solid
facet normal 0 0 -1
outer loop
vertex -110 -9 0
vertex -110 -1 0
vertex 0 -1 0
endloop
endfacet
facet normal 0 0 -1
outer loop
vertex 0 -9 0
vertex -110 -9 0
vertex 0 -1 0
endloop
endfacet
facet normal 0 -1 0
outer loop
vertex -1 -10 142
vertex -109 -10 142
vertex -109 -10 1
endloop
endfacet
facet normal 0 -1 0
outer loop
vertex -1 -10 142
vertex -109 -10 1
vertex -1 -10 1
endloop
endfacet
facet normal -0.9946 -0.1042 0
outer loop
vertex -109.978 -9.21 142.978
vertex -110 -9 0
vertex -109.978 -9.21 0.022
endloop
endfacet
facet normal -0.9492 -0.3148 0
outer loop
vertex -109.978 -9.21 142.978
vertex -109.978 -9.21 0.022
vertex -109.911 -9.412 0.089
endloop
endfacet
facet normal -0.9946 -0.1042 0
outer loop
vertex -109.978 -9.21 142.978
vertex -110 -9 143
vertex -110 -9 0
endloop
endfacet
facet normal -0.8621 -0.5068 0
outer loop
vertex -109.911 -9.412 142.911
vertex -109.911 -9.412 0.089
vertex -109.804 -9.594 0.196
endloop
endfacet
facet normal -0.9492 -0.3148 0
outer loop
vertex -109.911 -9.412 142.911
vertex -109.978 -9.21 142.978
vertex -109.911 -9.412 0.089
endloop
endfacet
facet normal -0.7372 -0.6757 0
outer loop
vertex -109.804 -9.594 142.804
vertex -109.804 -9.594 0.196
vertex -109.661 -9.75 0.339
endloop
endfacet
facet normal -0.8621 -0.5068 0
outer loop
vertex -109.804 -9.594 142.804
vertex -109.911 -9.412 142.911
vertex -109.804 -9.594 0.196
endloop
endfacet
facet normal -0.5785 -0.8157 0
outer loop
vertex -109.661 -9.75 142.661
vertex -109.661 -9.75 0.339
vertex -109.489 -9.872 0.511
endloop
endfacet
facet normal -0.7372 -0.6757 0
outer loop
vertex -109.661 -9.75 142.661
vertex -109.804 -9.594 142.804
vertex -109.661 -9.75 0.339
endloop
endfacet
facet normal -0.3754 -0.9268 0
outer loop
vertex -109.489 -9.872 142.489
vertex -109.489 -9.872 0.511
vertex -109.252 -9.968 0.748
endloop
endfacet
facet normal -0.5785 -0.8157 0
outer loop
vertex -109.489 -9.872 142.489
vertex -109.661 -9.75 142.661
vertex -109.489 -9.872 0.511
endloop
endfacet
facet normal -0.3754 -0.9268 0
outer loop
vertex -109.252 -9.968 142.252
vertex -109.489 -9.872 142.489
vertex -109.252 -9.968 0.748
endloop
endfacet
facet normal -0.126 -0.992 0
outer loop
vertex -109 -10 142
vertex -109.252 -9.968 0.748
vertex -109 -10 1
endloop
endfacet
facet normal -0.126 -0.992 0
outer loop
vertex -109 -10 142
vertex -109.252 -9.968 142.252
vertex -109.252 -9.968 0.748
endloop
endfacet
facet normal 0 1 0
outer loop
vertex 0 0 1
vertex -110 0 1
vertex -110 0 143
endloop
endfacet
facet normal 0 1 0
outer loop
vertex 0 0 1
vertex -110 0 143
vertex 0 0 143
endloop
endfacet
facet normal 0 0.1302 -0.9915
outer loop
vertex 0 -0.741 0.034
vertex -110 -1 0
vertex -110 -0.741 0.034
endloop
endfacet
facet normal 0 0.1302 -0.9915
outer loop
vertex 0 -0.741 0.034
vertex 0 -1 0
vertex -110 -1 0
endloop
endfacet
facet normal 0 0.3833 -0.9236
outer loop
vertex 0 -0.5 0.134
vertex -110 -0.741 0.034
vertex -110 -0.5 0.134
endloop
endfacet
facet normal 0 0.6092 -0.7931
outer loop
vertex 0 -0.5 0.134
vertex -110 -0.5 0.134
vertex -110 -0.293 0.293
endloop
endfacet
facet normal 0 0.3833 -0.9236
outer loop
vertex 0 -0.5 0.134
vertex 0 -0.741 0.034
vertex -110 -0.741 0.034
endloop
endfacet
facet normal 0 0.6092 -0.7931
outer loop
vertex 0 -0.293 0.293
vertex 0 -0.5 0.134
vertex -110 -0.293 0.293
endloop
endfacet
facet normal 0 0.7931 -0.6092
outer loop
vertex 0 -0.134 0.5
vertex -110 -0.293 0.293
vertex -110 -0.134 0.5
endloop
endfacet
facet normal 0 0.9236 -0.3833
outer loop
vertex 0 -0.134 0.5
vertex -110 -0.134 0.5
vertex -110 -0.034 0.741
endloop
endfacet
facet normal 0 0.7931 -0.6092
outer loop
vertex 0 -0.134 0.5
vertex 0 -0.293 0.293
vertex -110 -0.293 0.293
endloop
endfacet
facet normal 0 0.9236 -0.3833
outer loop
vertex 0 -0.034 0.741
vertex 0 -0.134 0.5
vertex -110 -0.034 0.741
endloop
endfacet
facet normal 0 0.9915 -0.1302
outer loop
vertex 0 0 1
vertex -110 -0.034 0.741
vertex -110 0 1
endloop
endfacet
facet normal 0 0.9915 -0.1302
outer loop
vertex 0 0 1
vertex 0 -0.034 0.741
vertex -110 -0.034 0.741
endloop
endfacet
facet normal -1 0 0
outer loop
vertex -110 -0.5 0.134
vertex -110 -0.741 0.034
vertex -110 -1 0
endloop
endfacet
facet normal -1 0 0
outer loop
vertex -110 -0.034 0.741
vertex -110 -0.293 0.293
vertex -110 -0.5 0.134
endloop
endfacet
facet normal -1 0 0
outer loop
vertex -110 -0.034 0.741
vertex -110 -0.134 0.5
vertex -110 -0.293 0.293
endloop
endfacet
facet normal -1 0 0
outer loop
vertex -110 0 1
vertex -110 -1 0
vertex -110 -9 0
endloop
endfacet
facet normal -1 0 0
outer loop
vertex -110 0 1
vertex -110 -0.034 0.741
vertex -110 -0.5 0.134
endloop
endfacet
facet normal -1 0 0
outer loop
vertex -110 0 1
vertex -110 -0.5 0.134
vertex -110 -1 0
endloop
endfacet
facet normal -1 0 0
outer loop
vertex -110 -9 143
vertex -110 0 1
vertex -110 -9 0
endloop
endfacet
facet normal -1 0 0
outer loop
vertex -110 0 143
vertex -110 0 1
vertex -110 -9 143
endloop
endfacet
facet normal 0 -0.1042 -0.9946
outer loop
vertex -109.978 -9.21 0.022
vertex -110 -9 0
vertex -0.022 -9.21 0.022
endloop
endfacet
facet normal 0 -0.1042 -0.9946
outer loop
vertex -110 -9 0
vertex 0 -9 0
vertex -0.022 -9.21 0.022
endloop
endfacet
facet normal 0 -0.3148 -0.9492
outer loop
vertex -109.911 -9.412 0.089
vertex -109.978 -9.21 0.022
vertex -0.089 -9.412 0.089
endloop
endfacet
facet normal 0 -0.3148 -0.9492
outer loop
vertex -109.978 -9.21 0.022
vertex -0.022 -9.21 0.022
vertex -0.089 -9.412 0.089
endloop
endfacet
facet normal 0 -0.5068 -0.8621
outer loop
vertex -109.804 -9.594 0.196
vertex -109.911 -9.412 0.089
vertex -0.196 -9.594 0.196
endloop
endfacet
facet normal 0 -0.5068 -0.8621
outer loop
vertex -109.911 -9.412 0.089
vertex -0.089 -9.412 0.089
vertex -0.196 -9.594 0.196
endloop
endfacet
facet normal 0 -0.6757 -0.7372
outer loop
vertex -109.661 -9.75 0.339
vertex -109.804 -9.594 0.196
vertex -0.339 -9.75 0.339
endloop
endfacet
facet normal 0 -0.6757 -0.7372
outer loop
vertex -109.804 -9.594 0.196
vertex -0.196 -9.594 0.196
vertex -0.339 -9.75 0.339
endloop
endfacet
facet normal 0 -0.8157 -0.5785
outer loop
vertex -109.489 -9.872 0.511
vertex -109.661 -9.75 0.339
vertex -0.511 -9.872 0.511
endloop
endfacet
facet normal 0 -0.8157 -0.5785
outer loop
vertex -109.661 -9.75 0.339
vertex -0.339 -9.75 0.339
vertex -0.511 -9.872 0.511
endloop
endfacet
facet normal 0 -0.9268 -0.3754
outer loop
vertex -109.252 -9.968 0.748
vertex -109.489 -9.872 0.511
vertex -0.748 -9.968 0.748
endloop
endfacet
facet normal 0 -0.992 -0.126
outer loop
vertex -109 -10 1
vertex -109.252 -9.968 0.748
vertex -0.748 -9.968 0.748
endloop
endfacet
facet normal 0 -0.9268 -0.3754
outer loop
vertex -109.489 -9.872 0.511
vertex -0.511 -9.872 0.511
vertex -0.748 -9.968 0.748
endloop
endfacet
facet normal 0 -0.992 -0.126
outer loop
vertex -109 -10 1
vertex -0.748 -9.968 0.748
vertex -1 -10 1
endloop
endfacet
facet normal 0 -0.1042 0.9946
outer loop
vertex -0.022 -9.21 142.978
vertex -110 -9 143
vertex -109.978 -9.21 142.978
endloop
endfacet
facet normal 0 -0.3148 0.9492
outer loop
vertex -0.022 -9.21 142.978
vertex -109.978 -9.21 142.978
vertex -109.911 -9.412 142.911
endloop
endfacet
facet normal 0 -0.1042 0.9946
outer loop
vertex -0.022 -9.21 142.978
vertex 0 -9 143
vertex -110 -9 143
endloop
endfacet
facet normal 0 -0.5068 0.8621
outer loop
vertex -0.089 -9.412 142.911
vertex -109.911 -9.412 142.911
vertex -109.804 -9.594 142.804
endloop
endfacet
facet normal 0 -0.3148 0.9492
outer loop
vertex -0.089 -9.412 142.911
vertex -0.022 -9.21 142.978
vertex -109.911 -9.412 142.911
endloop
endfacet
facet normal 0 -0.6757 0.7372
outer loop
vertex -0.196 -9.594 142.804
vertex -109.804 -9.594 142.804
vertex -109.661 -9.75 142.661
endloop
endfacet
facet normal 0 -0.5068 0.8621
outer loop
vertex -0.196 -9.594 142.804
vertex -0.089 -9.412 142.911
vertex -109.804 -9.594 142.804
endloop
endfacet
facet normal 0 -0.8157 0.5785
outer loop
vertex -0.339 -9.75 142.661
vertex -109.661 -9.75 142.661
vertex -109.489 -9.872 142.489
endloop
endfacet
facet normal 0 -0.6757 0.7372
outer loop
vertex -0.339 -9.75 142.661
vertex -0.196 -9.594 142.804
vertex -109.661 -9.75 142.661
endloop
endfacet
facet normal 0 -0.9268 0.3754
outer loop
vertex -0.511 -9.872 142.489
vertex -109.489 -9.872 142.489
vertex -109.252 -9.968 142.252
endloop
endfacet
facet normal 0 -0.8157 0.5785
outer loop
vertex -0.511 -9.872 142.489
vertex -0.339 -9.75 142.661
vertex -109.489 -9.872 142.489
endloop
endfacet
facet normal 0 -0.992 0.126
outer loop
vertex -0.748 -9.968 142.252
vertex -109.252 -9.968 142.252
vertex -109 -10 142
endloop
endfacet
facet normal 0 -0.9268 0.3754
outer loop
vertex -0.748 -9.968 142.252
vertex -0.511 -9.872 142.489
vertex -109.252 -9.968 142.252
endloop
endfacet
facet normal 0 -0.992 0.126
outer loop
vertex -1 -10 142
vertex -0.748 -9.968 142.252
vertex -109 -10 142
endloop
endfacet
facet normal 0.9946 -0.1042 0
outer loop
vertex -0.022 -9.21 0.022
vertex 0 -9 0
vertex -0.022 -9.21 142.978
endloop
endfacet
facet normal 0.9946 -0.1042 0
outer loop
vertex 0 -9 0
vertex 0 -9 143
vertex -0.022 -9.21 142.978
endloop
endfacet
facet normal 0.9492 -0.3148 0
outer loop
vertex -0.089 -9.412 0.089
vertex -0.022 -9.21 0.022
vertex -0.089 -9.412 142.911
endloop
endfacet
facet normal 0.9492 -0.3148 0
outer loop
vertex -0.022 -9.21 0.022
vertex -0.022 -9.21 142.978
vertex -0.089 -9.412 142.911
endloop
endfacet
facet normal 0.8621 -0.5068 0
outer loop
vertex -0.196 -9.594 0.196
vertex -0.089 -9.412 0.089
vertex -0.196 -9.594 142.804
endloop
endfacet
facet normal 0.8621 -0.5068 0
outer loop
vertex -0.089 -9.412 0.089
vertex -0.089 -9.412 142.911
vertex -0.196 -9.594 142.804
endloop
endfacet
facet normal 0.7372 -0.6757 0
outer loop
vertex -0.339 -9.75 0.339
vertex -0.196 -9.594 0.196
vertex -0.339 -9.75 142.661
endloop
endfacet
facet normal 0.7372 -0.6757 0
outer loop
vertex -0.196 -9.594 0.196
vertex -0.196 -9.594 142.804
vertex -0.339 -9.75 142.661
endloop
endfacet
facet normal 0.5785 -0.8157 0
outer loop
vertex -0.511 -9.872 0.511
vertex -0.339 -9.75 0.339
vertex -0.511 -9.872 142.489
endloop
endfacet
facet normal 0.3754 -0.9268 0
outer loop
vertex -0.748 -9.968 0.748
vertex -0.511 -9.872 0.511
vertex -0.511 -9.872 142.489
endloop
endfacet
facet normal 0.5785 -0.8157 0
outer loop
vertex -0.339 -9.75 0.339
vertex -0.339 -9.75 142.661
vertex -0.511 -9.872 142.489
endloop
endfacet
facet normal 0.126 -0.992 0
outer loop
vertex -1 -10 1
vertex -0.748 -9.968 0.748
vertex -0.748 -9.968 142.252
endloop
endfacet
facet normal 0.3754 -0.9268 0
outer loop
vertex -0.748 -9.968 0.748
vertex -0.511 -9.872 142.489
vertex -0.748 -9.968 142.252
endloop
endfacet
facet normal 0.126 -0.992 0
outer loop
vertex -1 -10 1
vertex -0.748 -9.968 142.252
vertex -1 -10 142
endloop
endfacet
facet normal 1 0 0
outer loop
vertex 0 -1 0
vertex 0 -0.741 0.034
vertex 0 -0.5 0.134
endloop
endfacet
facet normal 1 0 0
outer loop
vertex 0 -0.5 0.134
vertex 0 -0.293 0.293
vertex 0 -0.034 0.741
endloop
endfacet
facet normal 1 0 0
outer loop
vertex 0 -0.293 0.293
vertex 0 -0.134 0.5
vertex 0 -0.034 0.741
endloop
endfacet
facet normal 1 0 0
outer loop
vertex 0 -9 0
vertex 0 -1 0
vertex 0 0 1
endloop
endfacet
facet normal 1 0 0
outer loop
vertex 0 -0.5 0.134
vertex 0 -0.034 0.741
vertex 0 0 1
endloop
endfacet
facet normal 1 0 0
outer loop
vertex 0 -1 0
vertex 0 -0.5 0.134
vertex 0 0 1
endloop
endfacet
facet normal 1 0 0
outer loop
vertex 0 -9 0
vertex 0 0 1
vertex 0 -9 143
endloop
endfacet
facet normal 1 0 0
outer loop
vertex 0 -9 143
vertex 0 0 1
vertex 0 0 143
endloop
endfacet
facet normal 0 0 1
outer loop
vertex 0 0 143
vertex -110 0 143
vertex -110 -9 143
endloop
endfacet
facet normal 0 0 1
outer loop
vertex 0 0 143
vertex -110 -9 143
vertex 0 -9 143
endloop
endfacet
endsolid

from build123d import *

# Parameters (mm, degrees)
F0_W     = 110
F0_H     = 143
F1_DEPTH = 10
F2_R     = 1


with BuildPart() as f1:
    # F0 (on Front) → F1 (new body)
    with BuildSketch(Plane.XZ):
        with Locations((-55, 71.5)):
            Rectangle(F0_W, F0_H)
    extrude(amount=F1_DEPTH)

    # F2
    f2_edges = [f1.edges().sort_by_distance(p)[0] for p in [
        (0, -10, 71.5),
        (-110, -10, 71.5),
        (-55, 0, 0),
        (-55, -10, 0),
        (-55, -10, 143),
    ]]
    fillet(f2_edges, radius=F2_R)


solid = f1.part
